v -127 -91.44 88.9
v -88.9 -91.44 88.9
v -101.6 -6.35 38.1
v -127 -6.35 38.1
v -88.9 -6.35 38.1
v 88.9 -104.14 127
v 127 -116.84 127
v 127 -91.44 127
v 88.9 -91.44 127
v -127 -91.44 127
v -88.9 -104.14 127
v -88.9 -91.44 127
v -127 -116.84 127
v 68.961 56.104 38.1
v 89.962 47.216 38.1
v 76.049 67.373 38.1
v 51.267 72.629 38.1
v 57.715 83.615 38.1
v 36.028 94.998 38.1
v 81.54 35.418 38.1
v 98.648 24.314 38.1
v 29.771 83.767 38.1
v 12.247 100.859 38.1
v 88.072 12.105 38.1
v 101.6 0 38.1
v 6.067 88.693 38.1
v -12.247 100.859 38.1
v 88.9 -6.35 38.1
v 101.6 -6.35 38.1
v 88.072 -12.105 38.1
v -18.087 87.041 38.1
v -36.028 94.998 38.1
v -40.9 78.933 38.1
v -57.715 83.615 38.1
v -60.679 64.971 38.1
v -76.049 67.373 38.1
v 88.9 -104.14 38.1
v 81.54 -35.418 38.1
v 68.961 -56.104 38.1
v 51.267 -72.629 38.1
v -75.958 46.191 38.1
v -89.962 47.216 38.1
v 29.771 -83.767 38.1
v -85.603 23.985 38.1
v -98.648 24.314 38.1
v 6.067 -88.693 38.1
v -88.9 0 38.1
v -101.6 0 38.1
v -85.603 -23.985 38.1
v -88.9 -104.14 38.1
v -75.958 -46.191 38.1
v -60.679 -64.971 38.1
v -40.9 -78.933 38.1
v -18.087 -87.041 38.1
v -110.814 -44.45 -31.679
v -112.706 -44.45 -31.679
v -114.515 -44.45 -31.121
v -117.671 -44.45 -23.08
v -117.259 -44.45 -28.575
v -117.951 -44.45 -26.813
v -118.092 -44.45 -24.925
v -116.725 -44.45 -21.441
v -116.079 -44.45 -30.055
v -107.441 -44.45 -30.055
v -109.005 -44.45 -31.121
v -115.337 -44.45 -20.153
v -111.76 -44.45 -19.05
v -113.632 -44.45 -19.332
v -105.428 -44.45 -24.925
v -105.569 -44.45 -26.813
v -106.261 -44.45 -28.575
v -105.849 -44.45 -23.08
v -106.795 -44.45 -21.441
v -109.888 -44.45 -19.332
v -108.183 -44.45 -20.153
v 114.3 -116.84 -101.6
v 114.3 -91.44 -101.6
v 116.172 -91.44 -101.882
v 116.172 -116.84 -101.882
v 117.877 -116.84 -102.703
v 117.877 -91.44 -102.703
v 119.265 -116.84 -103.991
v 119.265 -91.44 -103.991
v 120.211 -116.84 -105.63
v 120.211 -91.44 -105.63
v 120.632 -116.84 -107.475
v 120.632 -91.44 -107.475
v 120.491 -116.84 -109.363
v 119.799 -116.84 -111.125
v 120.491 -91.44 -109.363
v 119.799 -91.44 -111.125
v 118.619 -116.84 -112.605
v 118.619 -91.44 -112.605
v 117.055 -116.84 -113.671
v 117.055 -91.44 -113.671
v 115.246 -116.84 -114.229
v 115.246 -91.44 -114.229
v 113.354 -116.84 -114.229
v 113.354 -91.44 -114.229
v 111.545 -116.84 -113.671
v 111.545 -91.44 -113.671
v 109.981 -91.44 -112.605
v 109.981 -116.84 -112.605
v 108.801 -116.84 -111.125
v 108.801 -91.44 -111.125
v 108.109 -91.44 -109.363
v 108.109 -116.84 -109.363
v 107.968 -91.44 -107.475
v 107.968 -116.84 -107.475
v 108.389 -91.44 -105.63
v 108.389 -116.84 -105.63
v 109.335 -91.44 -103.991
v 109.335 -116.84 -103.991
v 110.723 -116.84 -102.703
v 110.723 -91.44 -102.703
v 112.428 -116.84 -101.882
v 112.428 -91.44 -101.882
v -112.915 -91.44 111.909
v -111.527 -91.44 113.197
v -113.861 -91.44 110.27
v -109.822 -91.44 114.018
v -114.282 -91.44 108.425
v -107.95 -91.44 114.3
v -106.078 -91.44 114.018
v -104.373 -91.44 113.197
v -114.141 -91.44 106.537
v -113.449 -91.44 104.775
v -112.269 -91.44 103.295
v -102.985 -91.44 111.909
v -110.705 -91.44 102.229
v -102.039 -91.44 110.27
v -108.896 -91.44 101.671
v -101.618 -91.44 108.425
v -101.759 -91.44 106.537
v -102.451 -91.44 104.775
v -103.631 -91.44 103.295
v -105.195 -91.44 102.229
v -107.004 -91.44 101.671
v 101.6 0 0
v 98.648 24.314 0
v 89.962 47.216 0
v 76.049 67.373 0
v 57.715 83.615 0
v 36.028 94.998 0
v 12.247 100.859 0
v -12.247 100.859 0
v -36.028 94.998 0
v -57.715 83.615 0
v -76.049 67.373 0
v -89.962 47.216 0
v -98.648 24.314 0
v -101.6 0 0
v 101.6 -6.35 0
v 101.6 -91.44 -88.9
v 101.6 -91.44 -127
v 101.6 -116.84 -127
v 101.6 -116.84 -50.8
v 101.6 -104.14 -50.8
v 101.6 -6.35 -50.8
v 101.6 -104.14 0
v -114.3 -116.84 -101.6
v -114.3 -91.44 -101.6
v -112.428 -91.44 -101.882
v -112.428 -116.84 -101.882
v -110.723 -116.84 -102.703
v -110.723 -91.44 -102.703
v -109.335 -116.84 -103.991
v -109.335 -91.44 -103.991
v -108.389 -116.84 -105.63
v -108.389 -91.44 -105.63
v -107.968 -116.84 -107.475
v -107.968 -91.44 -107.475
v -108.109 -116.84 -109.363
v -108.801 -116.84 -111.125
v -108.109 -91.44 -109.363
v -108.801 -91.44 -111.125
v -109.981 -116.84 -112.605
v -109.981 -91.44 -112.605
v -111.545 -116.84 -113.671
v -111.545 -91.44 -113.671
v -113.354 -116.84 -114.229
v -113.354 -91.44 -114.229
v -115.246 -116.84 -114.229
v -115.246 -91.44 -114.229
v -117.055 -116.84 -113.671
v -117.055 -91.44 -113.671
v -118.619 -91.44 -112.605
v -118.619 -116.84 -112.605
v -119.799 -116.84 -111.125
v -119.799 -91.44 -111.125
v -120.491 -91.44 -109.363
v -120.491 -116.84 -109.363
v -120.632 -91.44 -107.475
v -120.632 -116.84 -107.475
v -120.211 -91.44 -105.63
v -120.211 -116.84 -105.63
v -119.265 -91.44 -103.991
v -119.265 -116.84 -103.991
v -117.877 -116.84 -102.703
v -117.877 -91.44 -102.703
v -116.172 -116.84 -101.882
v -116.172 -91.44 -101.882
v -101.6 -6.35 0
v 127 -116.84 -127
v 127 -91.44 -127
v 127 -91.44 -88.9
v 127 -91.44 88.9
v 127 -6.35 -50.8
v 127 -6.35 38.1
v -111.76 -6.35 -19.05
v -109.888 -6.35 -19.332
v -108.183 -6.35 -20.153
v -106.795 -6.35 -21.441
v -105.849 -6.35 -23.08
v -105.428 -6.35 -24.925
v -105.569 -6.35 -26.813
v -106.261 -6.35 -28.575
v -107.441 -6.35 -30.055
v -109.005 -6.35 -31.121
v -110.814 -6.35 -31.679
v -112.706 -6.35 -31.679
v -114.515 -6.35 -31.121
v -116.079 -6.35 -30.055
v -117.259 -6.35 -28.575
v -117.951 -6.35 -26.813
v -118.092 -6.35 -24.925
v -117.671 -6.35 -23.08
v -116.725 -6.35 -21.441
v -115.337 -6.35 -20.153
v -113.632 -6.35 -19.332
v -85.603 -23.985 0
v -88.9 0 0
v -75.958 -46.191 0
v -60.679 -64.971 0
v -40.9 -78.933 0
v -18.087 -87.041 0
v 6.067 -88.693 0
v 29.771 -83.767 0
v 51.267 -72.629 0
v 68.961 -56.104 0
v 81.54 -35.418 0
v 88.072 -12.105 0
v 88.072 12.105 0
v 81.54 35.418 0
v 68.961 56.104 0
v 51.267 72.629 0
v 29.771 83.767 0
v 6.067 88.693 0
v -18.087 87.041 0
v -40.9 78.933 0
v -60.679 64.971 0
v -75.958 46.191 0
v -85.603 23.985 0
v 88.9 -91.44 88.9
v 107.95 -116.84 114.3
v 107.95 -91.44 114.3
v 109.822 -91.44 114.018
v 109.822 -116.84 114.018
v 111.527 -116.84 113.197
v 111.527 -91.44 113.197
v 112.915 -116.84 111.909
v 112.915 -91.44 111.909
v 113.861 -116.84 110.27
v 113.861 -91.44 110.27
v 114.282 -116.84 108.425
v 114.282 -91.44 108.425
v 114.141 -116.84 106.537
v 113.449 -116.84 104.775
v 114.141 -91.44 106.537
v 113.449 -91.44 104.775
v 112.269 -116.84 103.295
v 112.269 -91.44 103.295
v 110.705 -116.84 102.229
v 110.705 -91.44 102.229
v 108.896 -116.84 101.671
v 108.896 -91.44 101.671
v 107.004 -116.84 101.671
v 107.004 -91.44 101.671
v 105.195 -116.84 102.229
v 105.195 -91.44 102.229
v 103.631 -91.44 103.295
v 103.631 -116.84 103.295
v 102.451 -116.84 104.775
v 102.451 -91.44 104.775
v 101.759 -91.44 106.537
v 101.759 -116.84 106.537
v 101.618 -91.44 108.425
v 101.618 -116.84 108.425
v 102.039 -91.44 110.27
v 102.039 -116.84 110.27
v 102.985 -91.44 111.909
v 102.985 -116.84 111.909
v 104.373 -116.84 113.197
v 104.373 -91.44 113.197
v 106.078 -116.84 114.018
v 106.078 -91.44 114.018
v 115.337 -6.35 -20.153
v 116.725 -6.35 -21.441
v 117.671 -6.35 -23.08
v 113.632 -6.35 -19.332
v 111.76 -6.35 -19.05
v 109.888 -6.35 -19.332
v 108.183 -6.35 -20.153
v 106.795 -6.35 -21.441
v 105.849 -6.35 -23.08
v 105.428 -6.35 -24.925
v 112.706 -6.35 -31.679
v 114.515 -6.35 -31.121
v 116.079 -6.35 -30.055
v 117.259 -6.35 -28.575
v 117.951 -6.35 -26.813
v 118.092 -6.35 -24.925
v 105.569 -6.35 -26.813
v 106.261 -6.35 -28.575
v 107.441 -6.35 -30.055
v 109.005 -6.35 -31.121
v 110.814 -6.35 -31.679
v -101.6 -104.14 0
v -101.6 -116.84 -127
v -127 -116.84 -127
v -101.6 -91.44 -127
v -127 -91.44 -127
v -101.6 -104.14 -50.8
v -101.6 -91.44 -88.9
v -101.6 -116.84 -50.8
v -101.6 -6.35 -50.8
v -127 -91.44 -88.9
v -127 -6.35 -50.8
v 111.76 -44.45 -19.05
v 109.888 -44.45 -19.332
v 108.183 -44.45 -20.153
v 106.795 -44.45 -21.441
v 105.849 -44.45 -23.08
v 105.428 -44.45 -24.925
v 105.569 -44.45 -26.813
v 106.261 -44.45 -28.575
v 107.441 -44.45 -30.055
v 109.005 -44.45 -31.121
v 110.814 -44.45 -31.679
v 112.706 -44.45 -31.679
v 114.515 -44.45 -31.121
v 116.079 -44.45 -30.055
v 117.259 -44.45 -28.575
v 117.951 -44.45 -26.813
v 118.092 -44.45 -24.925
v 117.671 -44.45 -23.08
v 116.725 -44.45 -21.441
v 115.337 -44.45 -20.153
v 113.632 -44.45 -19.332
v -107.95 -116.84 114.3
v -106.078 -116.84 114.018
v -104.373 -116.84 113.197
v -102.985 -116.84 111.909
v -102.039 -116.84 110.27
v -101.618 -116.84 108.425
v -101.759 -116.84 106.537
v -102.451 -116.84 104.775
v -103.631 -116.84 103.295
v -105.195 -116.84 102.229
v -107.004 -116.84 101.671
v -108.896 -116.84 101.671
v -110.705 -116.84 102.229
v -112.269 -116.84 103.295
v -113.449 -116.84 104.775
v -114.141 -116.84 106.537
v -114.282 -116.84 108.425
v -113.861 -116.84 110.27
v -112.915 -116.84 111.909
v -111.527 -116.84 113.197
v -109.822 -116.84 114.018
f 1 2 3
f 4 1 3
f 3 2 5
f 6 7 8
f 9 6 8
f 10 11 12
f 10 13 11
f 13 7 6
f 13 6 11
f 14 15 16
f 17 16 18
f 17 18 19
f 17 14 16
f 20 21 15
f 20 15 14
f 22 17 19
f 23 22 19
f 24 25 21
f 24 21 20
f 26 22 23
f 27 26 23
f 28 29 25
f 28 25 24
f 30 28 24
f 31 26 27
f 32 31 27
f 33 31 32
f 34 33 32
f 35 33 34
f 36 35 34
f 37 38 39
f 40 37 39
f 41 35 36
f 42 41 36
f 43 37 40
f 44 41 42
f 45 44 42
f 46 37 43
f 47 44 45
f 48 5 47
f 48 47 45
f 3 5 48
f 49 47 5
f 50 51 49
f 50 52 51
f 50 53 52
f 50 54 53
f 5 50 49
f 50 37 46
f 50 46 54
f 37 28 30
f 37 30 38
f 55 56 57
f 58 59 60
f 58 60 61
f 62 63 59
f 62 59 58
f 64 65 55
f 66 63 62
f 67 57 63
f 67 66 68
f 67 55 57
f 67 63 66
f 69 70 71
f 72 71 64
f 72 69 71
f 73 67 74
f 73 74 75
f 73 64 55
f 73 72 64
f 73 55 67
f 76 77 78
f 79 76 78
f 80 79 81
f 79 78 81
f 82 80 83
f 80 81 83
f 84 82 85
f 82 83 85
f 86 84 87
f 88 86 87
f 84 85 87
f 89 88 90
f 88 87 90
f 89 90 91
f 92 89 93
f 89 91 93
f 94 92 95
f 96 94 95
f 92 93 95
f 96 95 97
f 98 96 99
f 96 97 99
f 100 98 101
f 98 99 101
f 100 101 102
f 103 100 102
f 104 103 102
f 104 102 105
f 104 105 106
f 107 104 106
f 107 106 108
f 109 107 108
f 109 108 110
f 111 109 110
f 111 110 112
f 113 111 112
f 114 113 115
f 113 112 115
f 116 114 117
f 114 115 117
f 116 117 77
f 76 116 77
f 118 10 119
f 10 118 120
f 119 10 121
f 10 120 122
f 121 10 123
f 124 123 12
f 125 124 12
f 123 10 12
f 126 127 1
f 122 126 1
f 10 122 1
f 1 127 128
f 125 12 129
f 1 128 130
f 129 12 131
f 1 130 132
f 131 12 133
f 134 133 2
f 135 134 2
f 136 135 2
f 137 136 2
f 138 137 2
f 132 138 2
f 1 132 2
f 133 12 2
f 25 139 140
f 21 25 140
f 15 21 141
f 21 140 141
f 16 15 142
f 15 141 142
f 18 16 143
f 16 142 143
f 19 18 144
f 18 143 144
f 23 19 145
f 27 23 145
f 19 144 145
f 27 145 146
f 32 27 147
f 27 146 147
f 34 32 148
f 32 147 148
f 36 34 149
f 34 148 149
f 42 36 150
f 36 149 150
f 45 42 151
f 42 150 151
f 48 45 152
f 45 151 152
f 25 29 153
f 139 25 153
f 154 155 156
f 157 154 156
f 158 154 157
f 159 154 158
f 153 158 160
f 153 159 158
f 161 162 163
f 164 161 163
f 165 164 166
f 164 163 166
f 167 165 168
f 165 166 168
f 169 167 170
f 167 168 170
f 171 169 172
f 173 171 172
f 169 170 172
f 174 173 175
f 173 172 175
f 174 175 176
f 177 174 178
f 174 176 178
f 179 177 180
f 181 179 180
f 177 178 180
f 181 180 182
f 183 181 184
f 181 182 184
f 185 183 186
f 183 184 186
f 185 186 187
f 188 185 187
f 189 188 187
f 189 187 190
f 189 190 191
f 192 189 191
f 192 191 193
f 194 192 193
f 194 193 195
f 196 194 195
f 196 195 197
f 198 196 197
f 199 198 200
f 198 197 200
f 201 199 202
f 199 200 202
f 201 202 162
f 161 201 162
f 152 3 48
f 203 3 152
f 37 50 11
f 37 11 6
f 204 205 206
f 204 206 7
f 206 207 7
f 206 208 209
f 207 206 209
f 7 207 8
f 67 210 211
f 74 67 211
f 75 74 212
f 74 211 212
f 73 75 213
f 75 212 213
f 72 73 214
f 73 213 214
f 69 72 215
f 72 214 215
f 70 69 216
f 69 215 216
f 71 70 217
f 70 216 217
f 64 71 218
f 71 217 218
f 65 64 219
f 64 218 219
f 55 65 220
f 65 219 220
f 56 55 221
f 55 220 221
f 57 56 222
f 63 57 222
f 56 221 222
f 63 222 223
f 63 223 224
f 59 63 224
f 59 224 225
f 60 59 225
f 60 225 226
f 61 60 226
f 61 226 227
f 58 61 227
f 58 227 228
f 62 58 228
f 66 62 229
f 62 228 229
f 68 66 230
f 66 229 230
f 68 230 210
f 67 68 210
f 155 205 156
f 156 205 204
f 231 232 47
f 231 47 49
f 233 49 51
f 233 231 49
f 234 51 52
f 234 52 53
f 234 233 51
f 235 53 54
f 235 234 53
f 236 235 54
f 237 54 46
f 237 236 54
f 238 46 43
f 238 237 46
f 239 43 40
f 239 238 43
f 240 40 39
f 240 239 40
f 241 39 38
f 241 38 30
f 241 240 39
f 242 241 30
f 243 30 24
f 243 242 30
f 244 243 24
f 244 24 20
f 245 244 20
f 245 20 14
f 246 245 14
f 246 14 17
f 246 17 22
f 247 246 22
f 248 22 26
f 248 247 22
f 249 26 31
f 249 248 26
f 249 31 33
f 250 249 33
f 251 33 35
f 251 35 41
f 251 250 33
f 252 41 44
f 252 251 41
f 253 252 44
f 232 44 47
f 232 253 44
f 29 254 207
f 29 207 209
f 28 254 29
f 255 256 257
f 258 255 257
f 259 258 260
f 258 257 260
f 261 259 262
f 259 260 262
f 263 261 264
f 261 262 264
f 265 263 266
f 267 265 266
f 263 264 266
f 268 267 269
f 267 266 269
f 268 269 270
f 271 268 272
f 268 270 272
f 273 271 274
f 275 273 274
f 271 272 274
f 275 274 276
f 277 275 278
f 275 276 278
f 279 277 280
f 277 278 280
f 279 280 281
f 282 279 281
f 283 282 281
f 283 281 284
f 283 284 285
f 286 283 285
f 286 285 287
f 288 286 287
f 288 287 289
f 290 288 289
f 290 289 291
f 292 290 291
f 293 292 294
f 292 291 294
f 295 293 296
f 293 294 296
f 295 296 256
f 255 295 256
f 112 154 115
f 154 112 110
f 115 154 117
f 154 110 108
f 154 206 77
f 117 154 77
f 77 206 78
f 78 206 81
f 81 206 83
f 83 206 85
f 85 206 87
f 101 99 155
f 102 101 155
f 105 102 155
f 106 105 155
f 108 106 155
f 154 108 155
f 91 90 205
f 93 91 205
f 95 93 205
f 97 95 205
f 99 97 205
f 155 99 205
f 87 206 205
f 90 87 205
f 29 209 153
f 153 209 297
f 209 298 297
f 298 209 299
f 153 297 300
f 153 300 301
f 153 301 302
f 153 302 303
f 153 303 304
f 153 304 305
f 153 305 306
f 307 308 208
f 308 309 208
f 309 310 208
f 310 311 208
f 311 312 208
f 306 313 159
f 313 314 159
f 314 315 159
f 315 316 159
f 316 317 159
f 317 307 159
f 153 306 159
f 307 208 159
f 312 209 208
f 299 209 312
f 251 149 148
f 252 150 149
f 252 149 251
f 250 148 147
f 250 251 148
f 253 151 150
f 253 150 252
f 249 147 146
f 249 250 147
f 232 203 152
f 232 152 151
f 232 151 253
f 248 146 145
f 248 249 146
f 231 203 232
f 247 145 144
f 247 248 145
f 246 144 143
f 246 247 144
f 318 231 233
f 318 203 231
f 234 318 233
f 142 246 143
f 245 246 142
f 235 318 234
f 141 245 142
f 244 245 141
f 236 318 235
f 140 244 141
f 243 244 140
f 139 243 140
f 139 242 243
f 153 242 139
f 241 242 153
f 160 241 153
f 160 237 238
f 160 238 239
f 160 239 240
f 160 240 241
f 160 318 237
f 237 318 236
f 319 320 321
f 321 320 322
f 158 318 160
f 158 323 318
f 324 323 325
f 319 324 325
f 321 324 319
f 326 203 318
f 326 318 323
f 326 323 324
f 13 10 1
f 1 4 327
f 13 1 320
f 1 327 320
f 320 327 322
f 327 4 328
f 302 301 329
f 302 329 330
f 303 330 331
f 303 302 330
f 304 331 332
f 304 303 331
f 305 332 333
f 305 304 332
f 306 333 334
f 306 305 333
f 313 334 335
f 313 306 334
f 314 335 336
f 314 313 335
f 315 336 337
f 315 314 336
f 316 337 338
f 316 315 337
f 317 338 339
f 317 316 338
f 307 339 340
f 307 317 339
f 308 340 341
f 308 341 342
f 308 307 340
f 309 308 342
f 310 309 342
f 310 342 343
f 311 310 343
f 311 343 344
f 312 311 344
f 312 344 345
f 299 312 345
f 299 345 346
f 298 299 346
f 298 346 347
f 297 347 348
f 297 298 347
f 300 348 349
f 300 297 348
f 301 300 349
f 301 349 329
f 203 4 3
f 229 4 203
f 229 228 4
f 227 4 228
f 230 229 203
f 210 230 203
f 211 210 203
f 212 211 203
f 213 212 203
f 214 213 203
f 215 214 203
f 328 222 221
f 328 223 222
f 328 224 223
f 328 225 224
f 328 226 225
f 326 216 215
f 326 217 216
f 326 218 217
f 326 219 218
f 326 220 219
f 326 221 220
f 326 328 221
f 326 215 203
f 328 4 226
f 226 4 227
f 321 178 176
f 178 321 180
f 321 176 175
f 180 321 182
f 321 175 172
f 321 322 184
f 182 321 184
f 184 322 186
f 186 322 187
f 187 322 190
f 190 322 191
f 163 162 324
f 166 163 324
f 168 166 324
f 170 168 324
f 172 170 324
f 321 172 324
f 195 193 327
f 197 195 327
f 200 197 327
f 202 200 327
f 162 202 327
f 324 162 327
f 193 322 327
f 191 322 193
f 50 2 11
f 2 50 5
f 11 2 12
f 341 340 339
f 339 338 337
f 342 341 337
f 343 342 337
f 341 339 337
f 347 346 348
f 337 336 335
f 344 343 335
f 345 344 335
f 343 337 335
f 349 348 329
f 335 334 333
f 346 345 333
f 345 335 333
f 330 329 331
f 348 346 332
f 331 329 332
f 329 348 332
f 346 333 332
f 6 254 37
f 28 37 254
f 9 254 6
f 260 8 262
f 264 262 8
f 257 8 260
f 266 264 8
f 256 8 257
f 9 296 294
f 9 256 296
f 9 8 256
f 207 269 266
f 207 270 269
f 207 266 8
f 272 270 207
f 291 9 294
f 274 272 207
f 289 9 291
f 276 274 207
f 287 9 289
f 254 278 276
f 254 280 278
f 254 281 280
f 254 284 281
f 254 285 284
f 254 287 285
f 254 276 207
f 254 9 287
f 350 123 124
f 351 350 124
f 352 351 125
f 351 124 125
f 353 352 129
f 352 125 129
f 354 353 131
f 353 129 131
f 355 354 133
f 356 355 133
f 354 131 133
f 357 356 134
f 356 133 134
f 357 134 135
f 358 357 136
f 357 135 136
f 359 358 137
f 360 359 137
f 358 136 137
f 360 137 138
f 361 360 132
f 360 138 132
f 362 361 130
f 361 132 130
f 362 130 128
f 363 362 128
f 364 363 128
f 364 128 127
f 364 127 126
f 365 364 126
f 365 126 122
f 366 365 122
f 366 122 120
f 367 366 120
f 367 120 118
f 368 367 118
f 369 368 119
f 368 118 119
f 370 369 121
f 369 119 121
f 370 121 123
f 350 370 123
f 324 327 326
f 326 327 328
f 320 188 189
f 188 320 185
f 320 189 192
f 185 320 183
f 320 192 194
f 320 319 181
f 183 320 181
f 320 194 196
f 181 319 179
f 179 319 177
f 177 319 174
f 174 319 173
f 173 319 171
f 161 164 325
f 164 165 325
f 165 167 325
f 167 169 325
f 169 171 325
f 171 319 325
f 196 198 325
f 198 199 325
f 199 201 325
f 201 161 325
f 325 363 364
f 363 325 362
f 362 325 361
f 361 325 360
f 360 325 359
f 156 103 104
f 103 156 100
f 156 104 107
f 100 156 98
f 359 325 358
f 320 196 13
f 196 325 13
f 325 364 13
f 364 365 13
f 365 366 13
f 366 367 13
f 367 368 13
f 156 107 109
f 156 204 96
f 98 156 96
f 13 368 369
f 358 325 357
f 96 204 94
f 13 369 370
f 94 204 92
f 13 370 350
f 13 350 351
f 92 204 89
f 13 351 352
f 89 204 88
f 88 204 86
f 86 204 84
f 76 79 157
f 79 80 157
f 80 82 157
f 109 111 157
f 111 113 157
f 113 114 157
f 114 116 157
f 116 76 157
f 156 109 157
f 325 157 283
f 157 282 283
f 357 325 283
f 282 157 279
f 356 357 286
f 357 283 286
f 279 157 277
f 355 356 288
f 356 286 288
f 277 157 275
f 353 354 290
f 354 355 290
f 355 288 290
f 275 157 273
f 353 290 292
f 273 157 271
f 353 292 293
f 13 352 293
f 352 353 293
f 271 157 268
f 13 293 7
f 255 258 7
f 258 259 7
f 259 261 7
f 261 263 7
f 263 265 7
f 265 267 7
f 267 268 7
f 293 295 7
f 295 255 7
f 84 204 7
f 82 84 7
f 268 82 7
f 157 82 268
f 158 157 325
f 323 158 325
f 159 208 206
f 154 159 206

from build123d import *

# Parameters (mm, degrees)
SKETCH1_R                = 101.6
SKETCH1_R_2              = 88.9
BOSS_EXTRUDE1_DEPTH      = 38.1
SKETCH2_W                = 254
SKETCH2_H                = 177.8
BOSS_EXTRUDE2_DEPTH      = 12.7
BOSS_EXTRUDE3_REACH      = 275.106
BOSS_EXTRUDE3_END_RADIUS = 101.6
SKETCH3_W                = 203.2
SKETCH3_H                = 38.1
SKETCH10_W               = 25.4
SKETCH10_H               = 88.9
BOSS_EXTRUDE5_DEPTH      = 97.79
SKETCH11_R               = 6.35
CUT_EXTRUDE1_DEPTH       = 38.1
RIB3_START               = -38.1
RIB3_DEPTH               = 38.1
BOSS_EXTRUDE6_DEPTH      = 25.4
BOSS_EXTRUDE7_DEPTH      = 25.4
SKETCH17_R               = 6.35
CUT_EXTRUDE2_DEPTH       = 25.4


# Read off the part's stored shape, not the designer's step: Rib3
with BuildPart() as part:
    # Sketch1 → Boss-Extrude1 (new body)
    with BuildSketch(Plane.XY):
        with Locations(Location((0, 0, 0), (0, 0, 180))):
            Circle(SKETCH1_R)
        with Locations(Location((0, 0, 0), (0, 0, 180))):
            Circle(SKETCH1_R_2, mode=Mode.SUBTRACT)
    extrude(amount=BOSS_EXTRUDE1_DEPTH)



with BuildPart() as body_2:
    # Sketch2 → Boss-Extrude2 (new body)
    with BuildSketch(Plane(origin=(0, -116.84, 0), x_dir=(1, 0, 0), z_dir=(0, 1, 0))):
        with Locations((0, -38.1)):
            Rectangle(SKETCH2_W, SKETCH2_H)
    extrude(amount=BOSS_EXTRUDE2_DEPTH)


with BuildPart() as part_1:
    add(part.part)

    add(body_2.part)  # Boss-Extrude3 merges body 2
    # Boss-Extrude3: up to this cylinder (the profile starts outside it)
    boss_extrude3_end = Plane(origin=(0, 0, 19.05), z_dir=(0, 0, -1)) * Cylinder(BOSS_EXTRUDE3_END_RADIUS, 754.412, mode=Mode.PRIVATE)
    # Sketch3 → Boss-Extrude3 (add, up to the surface)
    with BuildSketch(Plane(origin=(0, -104.14, 0), x_dir=(1, 0, 0), z_dir=(0, 1, 0)), mode=Mode.PRIVATE) as boss_extrude3_sk1:
        with Locations((0, -19.05)):
            Rectangle(SKETCH3_W, SKETCH3_H)
    boss_extrude3_tool1 = extrude(boss_extrude3_sk1.sketch, amount=BOSS_EXTRUDE3_REACH, mode=Mode.PRIVATE) - boss_extrude3_end
    add(boss_extrude3_tool1.solids().sort_by_distance((0, -104.14, 19.05))[0])

    # Sketch10 → Boss-Extrude5 (add)
    with BuildSketch(Plane(origin=(0, -104.14, 0), x_dir=(1, 0, 0), z_dir=(0, 1, 0))):
        with Locations((-114.3, 6.35)):
            Rectangle(SKETCH10_W, SKETCH10_H)
    boss_extrude5 = extrude(amount=BOSS_EXTRUDE5_DEPTH)

    # Mirror1: Boss-Extrude5 across plane
    add(boss_extrude5.mirror(Plane(origin=(0, 0, 0), x_dir=(0, 0, 1), z_dir=(1, 0, 0))))

    # Sketch11 → Cut-Extrude1 (cut)
    with BuildSketch(Plane(origin=(0, -6.35, 0), x_dir=(1, 0, 0), z_dir=(0, 1, 0))):
        with Locations(Location((-111.76, 25.4, 0), (0, 0, 270))):
            Circle(SKETCH11_R)
    cut_extrude1 = extrude(amount=-CUT_EXTRUDE1_DEPTH, mode=Mode.SUBTRACT)

    # Mirror2: Cut-Extrude1 across plane
    add(cut_extrude1.mirror(Plane(origin=(0, 0, 0), x_dir=(0, 0, 1), z_dir=(1, 0, 0))), mode=Mode.SUBTRACT)

    # Rib3 outline → Rib3 (add)
    with BuildSketch(Plane.ZY.offset(127).offset(RIB3_START)):
        Polygon((127, -104.14), (127, -91.44), (88.9, -91.44), (38.1, -6.35), (38.1, -104.14), align=None)
    rib3 = extrude(amount=RIB3_DEPTH)

    # Mirror3: Rib3 across plane
    add(rib3.mirror(Plane(origin=(0, 0, 0), x_dir=(0, 0, 1), z_dir=(1, 0, 0))))

    # Sketch15 → Boss-Extrude6 (add)
    with BuildSketch(Plane.ZY.offset(127)):
        Polygon((-50.8, -6.35), (-50.8, -116.84), (-127, -116.84), (-127, -91.44), (-88.9, -91.44), align=None)
    extrude(amount=-BOSS_EXTRUDE6_DEPTH)

    # Sketch16 → Boss-Extrude7 (add)
    with BuildSketch(Plane(origin=(127, 0, 0), x_dir=(0, 0, -1), z_dir=(1, 0, 0))):
        Polygon((50.8, -6.35), (88.9, -91.44), (127, -91.44), (127, -116.84), (50.8, -116.84), align=None)
    extrude(amount=-BOSS_EXTRUDE7_DEPTH)

    # Sketch17 → Cut-Extrude2 (cut)
    with BuildSketch(Plane(origin=(0, -91.44, 0), x_dir=(1, 0, 0), z_dir=(0, 1, 0))):
        with Locations(Location((114.3, 107.95, 0), (0, 0, 270))):
            Circle(SKETCH17_R)
        with Locations(Location((-114.3, 107.95, 0), (0, 0, 270))):
            Circle(SKETCH17_R)
        with Locations(Location((-107.95, -107.95, 0), (0, 0, 270))):
            Circle(SKETCH17_R)
        with Locations(Location((107.95, -107.95, 0), (0, 0, 270))):
            Circle(SKETCH17_R)
    extrude(amount=-CUT_EXTRUDE2_DEPTH, mode=Mode.SUBTRACT)


solid = part_1.part
